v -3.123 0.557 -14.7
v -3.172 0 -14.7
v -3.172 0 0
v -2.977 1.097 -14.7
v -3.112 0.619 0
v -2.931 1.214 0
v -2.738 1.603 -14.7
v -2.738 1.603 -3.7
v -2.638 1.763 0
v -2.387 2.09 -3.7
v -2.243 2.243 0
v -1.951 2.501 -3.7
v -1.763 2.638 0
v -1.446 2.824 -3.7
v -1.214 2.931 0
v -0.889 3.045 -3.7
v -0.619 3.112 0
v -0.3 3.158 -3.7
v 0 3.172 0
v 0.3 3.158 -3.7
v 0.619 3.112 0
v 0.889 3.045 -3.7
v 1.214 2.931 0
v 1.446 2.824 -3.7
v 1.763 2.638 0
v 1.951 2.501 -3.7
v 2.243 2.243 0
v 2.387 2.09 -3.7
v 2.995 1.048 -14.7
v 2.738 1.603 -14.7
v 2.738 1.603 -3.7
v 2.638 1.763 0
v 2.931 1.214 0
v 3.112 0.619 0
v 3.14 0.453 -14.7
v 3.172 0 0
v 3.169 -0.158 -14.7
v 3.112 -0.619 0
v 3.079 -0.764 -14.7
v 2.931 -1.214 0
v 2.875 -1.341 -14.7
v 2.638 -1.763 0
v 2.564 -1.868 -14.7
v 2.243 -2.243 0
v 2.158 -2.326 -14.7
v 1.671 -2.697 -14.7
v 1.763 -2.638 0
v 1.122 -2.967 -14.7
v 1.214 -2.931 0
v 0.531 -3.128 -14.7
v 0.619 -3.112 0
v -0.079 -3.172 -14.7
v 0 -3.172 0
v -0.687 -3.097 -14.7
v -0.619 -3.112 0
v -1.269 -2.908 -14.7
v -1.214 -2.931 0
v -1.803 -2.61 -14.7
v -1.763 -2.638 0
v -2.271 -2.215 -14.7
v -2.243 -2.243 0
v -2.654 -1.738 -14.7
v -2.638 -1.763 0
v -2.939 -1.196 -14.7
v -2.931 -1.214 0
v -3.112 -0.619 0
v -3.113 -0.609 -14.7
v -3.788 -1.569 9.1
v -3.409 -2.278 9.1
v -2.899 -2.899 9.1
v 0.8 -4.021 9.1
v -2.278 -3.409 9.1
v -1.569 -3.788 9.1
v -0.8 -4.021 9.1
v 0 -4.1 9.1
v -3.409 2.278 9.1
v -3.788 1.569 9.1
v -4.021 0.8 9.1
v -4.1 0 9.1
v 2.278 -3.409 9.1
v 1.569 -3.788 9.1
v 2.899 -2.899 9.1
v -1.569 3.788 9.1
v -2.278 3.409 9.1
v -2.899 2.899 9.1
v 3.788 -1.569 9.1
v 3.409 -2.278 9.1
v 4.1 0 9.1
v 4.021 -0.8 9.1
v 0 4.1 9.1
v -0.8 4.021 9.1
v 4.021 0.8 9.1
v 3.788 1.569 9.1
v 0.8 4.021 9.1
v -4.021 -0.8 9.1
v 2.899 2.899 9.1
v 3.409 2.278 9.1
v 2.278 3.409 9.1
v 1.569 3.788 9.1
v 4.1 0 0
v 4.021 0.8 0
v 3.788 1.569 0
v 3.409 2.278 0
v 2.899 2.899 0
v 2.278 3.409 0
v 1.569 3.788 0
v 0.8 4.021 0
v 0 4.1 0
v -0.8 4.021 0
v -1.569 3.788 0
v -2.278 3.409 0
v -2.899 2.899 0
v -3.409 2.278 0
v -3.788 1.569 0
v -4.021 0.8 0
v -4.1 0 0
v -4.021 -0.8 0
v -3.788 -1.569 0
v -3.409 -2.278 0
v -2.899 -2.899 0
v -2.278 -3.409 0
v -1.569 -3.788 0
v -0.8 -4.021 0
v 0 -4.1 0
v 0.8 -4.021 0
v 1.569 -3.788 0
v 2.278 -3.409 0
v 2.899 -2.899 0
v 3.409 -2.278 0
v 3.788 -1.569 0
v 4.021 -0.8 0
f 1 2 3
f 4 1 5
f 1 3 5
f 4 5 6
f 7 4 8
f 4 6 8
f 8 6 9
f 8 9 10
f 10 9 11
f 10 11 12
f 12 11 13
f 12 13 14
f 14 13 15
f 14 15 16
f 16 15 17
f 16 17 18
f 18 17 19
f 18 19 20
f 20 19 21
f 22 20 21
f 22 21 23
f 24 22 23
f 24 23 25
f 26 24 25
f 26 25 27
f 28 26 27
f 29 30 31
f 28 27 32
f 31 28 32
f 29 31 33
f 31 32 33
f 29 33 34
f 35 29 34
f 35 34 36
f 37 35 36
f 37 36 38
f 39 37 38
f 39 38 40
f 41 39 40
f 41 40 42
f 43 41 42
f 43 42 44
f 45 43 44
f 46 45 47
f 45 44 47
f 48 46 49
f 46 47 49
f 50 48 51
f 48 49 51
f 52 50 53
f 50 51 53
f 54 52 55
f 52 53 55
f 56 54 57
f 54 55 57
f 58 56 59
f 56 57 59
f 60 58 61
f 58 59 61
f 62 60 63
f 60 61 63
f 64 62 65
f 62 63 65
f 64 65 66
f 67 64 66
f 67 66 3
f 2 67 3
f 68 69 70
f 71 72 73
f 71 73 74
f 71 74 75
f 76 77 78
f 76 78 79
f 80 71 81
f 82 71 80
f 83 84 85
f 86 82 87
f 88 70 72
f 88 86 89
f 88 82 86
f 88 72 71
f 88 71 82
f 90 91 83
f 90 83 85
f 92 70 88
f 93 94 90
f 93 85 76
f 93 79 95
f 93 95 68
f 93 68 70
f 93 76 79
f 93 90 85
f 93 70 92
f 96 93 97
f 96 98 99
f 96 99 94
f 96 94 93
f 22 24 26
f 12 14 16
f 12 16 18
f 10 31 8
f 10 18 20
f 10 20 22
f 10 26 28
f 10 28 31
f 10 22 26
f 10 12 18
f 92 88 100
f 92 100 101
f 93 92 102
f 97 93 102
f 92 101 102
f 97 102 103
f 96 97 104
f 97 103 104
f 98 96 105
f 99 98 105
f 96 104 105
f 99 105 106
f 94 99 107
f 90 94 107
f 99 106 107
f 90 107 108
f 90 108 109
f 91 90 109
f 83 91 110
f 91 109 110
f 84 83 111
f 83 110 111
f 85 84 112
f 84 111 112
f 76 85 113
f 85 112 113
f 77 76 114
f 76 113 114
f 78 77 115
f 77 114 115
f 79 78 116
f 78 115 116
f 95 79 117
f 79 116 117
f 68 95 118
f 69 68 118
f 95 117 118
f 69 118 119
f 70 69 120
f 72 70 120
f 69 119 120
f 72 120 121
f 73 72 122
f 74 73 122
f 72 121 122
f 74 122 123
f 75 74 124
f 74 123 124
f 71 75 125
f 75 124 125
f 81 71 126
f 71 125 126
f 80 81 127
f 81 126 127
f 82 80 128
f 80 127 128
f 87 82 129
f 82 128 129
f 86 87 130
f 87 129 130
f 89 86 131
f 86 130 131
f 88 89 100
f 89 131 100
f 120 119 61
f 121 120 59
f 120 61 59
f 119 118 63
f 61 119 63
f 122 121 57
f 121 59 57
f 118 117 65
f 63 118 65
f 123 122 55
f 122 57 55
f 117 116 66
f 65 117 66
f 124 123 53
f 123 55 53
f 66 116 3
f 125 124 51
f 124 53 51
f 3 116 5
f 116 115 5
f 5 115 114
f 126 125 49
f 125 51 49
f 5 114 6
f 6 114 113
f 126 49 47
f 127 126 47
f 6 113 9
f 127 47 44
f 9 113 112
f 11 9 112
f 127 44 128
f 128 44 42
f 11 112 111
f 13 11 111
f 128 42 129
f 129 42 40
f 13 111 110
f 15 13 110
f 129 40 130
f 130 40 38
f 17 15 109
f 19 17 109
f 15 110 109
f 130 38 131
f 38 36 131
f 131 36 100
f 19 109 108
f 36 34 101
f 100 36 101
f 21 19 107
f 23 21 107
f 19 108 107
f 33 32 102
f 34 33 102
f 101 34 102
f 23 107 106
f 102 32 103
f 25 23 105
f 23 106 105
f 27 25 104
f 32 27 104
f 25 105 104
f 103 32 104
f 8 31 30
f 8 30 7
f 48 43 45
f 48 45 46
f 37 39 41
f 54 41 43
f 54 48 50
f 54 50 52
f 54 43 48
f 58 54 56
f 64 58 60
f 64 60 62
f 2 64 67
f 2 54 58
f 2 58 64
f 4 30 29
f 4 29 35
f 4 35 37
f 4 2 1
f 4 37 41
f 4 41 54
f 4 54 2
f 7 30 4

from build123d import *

# Parameters (mm, degrees)
SKETCH2_R           = 4.1
BOSS_EXTRUDE1_DEPTH = 9.1
SKETCH3_R           = 3.1725
BOSS_EXTRUDE2_DEPTH = 14.7
CUT_EXTRUDE1_START  = -11
CUT_EXTRUDE1_DEPTH  = 11


with BuildPart() as part:
    # Sketch2 → Boss-Extrude1 (new body)
    with BuildSketch(Plane.XY):
        Circle(SKETCH2_R)
    extrude(amount=BOSS_EXTRUDE1_DEPTH)

    # Sketch3 → Boss-Extrude2 (add)
    with BuildSketch(Plane(origin=(0, 0, 0), x_dir=(-1, 0, 0), z_dir=(0, 0, -1))):
        Circle(SKETCH3_R)
    extrude(amount=BOSS_EXTRUDE2_DEPTH)

    # Sketch4 → Cut-Extrude1 (cut)
    with BuildSketch(Plane(origin=(0, 0, -14.7), x_dir=(-1, 0, 0), z_dir=(0, 0, -1)).offset(CUT_EXTRUDE1_START)):
        with BuildLine():
            Line((-2.737651106, 1.603129026), (2.737651106, 1.603129026))
            ThreePointArc((2.737651106, 1.603129026), (0, 3.1725), (-2.737651106, 1.603129026))
        make_face()
    extrude(amount=CUT_EXTRUDE1_DEPTH, mode=Mode.SUBTRACT)


solid = part.part
